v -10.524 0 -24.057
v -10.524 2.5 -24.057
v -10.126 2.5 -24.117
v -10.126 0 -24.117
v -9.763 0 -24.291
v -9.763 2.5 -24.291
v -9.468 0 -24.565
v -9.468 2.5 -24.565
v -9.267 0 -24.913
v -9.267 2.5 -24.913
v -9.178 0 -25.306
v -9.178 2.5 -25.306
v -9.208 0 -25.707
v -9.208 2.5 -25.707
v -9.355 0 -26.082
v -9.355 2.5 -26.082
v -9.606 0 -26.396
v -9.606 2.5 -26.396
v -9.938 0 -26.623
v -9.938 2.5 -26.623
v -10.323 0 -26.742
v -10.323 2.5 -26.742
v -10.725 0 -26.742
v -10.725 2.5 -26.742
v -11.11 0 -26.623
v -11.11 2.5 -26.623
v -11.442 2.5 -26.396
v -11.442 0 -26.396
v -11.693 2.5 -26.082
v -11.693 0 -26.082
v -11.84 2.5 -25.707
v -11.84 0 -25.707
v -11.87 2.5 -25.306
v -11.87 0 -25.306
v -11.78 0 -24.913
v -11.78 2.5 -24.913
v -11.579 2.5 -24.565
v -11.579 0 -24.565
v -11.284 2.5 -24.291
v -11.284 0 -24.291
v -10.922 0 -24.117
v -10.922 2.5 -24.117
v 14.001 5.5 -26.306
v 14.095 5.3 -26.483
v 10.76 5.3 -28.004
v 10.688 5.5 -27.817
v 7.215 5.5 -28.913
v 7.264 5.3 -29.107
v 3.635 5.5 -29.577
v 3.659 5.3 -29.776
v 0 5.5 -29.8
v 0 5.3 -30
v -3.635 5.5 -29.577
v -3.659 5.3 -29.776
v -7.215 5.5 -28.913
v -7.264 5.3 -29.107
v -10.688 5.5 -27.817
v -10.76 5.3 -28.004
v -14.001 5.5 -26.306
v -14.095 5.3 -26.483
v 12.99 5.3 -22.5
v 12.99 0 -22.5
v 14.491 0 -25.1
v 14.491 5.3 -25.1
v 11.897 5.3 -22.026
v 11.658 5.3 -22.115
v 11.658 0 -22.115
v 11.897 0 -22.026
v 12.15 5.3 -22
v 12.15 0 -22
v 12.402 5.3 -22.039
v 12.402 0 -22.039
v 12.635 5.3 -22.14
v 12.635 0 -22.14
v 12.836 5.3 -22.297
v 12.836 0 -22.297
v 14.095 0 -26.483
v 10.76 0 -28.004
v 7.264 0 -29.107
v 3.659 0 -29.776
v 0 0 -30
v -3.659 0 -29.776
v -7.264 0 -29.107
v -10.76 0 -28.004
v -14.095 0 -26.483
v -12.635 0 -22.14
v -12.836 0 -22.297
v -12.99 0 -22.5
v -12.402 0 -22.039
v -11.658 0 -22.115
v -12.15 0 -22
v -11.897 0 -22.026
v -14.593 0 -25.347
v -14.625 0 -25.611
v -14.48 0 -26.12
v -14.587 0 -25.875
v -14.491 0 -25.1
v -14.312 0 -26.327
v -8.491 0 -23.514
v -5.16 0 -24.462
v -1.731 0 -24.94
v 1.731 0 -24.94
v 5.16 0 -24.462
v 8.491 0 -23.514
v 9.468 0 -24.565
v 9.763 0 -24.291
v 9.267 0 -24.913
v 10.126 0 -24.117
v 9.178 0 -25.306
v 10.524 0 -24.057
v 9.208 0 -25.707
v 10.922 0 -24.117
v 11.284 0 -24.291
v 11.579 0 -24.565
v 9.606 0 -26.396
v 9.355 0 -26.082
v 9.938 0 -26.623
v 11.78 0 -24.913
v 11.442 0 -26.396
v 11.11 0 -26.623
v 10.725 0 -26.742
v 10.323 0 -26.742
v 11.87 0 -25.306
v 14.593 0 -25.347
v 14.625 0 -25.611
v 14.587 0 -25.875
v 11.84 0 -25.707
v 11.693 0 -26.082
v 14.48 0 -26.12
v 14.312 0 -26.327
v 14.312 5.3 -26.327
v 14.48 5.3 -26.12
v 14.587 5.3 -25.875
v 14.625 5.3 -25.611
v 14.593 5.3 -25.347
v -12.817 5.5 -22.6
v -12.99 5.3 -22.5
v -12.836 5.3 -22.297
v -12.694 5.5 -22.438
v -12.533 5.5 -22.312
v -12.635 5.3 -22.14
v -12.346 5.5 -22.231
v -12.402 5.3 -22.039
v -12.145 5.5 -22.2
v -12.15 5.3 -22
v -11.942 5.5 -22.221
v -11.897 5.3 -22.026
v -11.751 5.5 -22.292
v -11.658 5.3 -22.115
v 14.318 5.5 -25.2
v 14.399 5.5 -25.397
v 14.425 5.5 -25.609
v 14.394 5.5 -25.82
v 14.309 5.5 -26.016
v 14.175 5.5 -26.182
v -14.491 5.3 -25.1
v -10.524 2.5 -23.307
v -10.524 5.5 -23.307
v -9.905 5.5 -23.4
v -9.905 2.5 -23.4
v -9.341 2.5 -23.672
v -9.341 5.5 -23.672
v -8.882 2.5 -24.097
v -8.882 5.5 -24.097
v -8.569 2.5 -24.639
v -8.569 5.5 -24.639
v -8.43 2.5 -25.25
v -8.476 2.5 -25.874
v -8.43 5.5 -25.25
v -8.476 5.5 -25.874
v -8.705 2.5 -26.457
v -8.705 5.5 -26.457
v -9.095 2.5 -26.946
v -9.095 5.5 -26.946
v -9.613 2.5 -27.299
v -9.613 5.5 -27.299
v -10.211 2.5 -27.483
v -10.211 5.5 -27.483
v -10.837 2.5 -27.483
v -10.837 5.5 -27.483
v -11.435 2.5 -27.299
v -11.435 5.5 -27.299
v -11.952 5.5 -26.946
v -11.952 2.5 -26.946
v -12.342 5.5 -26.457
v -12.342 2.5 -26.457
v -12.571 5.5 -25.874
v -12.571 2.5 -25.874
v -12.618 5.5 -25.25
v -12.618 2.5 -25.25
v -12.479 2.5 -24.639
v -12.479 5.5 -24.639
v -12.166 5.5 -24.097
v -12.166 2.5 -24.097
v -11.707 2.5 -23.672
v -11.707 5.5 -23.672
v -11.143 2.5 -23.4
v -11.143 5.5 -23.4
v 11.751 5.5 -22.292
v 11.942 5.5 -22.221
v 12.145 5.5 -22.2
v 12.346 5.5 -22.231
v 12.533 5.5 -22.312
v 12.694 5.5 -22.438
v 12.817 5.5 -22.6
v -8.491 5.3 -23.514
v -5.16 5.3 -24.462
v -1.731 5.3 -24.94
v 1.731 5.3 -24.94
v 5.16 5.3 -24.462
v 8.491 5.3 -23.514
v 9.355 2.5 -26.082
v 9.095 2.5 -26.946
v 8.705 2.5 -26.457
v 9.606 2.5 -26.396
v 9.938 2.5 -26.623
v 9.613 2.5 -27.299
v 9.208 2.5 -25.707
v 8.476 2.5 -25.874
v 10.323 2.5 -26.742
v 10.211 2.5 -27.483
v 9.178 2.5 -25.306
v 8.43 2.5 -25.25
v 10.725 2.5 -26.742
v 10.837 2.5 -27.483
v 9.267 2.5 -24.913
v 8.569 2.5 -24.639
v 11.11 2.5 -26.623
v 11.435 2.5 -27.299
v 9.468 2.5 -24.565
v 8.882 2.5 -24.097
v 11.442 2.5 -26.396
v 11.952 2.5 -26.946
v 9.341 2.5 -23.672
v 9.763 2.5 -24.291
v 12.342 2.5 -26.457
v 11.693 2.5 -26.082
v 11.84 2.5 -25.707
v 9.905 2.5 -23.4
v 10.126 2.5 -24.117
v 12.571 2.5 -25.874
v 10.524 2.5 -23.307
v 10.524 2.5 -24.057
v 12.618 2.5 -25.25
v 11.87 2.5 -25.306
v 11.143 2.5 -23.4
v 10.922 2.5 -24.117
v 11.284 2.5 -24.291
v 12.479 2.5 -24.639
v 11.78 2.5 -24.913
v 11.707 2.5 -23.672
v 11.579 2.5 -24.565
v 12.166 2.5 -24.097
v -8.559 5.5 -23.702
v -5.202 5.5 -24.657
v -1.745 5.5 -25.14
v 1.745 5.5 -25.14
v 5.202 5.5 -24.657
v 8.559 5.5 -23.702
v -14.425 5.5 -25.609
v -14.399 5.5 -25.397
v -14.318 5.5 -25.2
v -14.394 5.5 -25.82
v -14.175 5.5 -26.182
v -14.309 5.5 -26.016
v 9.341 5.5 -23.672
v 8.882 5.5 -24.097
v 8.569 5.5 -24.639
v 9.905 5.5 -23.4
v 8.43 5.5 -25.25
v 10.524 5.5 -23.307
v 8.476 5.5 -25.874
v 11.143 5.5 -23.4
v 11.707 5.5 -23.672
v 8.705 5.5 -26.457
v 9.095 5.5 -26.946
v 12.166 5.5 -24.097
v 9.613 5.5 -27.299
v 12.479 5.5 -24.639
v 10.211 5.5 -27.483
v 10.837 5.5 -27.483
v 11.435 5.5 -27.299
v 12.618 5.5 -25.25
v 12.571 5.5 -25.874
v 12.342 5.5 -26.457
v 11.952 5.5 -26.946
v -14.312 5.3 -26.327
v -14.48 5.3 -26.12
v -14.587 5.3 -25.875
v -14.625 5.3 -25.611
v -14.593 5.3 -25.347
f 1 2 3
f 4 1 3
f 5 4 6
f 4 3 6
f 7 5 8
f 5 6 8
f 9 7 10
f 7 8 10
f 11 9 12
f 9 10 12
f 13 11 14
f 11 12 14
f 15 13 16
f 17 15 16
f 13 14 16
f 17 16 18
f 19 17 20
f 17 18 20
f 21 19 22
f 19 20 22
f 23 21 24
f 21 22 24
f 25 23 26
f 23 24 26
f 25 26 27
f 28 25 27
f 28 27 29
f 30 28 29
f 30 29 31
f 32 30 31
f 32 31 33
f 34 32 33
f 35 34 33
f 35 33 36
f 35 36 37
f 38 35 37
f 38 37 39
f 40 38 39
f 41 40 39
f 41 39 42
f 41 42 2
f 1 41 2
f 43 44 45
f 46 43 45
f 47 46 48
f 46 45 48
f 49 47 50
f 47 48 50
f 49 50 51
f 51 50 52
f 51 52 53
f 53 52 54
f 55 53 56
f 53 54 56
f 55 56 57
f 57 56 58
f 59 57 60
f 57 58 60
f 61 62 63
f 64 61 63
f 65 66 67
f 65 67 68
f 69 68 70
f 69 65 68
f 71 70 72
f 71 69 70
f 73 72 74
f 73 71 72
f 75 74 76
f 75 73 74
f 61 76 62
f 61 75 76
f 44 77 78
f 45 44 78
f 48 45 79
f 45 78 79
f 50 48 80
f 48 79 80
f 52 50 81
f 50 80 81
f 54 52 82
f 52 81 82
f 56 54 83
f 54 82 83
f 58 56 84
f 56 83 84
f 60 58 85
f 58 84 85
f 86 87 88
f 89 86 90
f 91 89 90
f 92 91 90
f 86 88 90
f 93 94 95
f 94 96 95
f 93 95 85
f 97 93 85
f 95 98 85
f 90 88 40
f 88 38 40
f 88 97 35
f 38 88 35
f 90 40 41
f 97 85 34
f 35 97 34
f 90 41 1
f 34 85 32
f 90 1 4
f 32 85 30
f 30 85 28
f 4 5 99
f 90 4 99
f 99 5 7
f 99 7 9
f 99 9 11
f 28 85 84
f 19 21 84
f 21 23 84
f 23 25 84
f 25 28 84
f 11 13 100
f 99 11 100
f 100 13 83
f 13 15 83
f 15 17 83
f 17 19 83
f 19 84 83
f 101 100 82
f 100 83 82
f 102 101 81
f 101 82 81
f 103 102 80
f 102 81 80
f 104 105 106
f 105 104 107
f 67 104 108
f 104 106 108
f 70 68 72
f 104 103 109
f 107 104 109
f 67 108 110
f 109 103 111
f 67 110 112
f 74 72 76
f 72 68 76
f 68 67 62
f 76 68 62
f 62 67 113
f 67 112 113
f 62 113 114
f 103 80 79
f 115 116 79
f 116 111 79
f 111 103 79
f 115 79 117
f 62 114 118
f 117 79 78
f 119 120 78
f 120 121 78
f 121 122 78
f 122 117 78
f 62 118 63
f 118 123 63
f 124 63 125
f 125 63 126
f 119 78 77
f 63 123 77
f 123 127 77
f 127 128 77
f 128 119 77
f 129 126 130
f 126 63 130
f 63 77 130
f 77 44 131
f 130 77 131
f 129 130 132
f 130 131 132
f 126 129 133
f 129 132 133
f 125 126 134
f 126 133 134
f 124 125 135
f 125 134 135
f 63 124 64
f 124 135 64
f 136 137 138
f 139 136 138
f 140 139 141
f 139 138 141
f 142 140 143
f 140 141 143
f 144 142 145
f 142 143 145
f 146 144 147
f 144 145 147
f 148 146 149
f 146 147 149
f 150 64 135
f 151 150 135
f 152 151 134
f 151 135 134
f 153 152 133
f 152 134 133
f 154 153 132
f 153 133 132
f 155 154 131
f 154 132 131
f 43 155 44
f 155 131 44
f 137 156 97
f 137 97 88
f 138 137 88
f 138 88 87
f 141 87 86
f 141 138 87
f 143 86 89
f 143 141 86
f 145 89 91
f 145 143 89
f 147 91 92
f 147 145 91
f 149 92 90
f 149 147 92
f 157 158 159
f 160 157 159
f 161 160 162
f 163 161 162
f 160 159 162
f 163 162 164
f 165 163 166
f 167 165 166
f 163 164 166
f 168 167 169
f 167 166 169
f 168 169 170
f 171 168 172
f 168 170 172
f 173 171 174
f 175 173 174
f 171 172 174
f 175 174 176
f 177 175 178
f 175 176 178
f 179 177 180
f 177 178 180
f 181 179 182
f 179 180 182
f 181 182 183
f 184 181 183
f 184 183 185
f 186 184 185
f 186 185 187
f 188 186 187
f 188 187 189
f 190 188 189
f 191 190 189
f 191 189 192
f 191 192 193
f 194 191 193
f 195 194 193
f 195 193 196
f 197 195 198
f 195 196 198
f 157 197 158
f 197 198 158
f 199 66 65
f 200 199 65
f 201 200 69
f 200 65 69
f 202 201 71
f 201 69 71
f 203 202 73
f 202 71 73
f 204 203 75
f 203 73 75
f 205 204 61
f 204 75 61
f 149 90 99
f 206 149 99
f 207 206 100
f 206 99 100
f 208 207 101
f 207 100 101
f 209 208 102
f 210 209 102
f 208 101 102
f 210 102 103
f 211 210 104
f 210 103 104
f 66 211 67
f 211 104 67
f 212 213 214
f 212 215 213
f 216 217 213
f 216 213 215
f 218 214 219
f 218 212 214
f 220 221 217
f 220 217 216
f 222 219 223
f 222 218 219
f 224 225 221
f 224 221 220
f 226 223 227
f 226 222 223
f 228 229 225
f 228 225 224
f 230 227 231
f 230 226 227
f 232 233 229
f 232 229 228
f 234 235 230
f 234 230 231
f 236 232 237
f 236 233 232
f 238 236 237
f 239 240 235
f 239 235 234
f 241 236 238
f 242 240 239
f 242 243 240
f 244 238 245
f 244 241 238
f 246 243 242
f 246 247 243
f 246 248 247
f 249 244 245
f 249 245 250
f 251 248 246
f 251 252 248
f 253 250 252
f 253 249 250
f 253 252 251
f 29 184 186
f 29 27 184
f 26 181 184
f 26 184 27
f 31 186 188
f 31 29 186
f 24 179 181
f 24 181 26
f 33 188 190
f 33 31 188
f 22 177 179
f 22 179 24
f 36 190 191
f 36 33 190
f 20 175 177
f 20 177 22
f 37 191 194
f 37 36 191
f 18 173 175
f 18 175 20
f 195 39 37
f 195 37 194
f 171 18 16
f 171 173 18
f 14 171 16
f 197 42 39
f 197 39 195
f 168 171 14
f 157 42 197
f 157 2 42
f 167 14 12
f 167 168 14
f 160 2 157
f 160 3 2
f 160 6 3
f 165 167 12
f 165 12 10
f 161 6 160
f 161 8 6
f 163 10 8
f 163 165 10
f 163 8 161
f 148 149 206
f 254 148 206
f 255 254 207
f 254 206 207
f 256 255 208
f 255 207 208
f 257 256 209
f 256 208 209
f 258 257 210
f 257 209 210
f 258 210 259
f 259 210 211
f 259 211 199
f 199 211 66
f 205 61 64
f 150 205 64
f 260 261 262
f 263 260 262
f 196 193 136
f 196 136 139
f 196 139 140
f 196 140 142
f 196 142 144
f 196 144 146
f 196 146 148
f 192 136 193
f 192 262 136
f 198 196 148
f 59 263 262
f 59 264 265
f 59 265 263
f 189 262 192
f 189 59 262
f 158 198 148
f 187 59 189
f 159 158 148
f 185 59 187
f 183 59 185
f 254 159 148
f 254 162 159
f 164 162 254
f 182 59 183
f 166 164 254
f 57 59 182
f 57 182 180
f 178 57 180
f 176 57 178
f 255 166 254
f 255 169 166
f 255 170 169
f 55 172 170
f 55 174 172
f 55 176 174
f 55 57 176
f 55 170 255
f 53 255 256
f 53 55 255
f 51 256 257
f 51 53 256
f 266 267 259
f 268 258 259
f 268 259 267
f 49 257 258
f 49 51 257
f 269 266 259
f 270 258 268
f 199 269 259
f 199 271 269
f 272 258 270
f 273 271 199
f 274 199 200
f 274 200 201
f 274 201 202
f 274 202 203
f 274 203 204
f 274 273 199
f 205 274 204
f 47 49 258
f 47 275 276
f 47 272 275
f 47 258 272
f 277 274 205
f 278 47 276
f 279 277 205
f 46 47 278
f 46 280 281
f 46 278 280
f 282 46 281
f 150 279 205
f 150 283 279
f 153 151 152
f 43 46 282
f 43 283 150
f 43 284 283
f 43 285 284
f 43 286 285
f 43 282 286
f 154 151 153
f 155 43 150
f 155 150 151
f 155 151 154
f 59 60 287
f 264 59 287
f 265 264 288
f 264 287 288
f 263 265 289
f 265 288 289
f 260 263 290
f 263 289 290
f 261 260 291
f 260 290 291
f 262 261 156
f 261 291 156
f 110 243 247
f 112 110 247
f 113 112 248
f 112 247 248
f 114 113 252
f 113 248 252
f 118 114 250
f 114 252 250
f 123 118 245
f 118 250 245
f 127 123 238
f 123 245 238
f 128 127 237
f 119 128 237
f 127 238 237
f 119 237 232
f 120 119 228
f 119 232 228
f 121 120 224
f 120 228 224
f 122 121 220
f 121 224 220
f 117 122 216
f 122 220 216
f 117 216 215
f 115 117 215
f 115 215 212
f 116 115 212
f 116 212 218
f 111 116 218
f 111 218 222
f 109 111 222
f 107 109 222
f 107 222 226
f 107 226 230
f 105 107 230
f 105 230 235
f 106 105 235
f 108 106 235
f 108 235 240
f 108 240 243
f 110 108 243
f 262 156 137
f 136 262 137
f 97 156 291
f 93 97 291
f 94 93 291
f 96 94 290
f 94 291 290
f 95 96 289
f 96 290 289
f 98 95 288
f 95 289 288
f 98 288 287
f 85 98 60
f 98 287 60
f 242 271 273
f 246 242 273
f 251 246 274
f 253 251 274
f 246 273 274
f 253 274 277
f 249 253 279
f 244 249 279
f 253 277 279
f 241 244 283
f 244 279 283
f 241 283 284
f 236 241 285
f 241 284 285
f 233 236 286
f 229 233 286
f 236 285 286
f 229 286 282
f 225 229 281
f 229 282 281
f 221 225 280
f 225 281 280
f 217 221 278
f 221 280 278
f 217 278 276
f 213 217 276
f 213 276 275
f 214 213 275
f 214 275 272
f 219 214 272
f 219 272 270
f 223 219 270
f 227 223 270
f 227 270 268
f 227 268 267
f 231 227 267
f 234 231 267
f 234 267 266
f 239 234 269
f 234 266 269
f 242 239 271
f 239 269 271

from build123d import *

# Parameters (mm, degrees)
EXTRUDE_1_DEPTH     = 5.5
SKETCH_2_R          = 2.1
CUT_EXTRUDE_2_DEPTH = 3
SKETCH_4_R          = 1.35
CUT_EXTRUDE_3_DEPTH = 7
FILLET_2_R          = 1
CHAMFER_1_SIZE      = 0.2


with BuildPart() as part:
    # 草图1 → 凸台-拉伸1 (new body)
    with BuildSketch(Plane(origin=(0, 0, 0), x_dir=(1, 0, 0), z_dir=(0, 1, 0))):
        with BuildLine():
            Line((-15, 25.980762114), (-12.5, 21.650635095))
            ThreePointArc((-12.5, 21.650635095), (0, 25), (12.5, 21.650635095))
            Line((12.5, 21.650635095), (15, 25.980762114))
            ThreePointArc((15, 25.980762114), (0, 30), (-15, 25.980762114))
        make_face()
    extrude(amount=EXTRUDE_1_DEPTH)

    # 草图2 → 切除-拉伸2 (cut)
    with BuildSketch(Plane(origin=(0, 5.5, 0), x_dir=(1, 0, 0), z_dir=(0, 1, 0))):
        with Locations(Location((-10.52379439, 25.406687144, 0), (0, 0, 270))):
            Circle(SKETCH_2_R)
        with Locations(Location((10.52379439, 25.406687144, 0), (0, 0, 270))):
            Circle(SKETCH_2_R)
    extrude(amount=-CUT_EXTRUDE_2_DEPTH, mode=Mode.SUBTRACT)

    # 草图4 → 切除-拉伸3 (cut)
    with BuildSketch(Plane(origin=(0, 5.5, 0), x_dir=(1, 0, 0), z_dir=(0, 1, 0))):
        with Locations(Location((-10.52379439, 25.406687144, 0), (0, 0, 270))):
            Circle(SKETCH_4_R)
        with Locations(Location((10.52379439, 25.406687144, 0), (0, 0, 270))):
            Circle(SKETCH_4_R)
    extrude(amount=-CUT_EXTRUDE_3_DEPTH, mode=Mode.SUBTRACT)

    # 圆角2
    fillet_2_edges = [part.edges().sort_by_distance(p)[0] for p in [
        (15, 2.75, -25.980762114),
        (12.5, 2.75, -21.650635095),
        (-12.5, 2.75, -21.650635095),
        (-15, 2.75, -25.980762114),
    ]]
    fillet(fillet_2_edges, radius=FILLET_2_R)

    # 倒角1
    chamfer_1_edges = [part.edges().sort_by_distance(p)[0] for p in [
        (0, 5.5, -30),
        (13.740878901, 5.5, -23.799900398),
        (-13.740878901, 5.5, -23.799900398),
        (0, 5.5, -25),
        (-12.401705751, 5.5, -22.039231077),
        (-14.586670486, 5.5, -25.875237728),
        (12.401705751, 5.5, -22.039231077),
        (14.586670486, 5.5, -25.875237728),
    ]]
    chamfer(chamfer_1_edges, length=CHAMFER_1_SIZE)


solid = part.part
